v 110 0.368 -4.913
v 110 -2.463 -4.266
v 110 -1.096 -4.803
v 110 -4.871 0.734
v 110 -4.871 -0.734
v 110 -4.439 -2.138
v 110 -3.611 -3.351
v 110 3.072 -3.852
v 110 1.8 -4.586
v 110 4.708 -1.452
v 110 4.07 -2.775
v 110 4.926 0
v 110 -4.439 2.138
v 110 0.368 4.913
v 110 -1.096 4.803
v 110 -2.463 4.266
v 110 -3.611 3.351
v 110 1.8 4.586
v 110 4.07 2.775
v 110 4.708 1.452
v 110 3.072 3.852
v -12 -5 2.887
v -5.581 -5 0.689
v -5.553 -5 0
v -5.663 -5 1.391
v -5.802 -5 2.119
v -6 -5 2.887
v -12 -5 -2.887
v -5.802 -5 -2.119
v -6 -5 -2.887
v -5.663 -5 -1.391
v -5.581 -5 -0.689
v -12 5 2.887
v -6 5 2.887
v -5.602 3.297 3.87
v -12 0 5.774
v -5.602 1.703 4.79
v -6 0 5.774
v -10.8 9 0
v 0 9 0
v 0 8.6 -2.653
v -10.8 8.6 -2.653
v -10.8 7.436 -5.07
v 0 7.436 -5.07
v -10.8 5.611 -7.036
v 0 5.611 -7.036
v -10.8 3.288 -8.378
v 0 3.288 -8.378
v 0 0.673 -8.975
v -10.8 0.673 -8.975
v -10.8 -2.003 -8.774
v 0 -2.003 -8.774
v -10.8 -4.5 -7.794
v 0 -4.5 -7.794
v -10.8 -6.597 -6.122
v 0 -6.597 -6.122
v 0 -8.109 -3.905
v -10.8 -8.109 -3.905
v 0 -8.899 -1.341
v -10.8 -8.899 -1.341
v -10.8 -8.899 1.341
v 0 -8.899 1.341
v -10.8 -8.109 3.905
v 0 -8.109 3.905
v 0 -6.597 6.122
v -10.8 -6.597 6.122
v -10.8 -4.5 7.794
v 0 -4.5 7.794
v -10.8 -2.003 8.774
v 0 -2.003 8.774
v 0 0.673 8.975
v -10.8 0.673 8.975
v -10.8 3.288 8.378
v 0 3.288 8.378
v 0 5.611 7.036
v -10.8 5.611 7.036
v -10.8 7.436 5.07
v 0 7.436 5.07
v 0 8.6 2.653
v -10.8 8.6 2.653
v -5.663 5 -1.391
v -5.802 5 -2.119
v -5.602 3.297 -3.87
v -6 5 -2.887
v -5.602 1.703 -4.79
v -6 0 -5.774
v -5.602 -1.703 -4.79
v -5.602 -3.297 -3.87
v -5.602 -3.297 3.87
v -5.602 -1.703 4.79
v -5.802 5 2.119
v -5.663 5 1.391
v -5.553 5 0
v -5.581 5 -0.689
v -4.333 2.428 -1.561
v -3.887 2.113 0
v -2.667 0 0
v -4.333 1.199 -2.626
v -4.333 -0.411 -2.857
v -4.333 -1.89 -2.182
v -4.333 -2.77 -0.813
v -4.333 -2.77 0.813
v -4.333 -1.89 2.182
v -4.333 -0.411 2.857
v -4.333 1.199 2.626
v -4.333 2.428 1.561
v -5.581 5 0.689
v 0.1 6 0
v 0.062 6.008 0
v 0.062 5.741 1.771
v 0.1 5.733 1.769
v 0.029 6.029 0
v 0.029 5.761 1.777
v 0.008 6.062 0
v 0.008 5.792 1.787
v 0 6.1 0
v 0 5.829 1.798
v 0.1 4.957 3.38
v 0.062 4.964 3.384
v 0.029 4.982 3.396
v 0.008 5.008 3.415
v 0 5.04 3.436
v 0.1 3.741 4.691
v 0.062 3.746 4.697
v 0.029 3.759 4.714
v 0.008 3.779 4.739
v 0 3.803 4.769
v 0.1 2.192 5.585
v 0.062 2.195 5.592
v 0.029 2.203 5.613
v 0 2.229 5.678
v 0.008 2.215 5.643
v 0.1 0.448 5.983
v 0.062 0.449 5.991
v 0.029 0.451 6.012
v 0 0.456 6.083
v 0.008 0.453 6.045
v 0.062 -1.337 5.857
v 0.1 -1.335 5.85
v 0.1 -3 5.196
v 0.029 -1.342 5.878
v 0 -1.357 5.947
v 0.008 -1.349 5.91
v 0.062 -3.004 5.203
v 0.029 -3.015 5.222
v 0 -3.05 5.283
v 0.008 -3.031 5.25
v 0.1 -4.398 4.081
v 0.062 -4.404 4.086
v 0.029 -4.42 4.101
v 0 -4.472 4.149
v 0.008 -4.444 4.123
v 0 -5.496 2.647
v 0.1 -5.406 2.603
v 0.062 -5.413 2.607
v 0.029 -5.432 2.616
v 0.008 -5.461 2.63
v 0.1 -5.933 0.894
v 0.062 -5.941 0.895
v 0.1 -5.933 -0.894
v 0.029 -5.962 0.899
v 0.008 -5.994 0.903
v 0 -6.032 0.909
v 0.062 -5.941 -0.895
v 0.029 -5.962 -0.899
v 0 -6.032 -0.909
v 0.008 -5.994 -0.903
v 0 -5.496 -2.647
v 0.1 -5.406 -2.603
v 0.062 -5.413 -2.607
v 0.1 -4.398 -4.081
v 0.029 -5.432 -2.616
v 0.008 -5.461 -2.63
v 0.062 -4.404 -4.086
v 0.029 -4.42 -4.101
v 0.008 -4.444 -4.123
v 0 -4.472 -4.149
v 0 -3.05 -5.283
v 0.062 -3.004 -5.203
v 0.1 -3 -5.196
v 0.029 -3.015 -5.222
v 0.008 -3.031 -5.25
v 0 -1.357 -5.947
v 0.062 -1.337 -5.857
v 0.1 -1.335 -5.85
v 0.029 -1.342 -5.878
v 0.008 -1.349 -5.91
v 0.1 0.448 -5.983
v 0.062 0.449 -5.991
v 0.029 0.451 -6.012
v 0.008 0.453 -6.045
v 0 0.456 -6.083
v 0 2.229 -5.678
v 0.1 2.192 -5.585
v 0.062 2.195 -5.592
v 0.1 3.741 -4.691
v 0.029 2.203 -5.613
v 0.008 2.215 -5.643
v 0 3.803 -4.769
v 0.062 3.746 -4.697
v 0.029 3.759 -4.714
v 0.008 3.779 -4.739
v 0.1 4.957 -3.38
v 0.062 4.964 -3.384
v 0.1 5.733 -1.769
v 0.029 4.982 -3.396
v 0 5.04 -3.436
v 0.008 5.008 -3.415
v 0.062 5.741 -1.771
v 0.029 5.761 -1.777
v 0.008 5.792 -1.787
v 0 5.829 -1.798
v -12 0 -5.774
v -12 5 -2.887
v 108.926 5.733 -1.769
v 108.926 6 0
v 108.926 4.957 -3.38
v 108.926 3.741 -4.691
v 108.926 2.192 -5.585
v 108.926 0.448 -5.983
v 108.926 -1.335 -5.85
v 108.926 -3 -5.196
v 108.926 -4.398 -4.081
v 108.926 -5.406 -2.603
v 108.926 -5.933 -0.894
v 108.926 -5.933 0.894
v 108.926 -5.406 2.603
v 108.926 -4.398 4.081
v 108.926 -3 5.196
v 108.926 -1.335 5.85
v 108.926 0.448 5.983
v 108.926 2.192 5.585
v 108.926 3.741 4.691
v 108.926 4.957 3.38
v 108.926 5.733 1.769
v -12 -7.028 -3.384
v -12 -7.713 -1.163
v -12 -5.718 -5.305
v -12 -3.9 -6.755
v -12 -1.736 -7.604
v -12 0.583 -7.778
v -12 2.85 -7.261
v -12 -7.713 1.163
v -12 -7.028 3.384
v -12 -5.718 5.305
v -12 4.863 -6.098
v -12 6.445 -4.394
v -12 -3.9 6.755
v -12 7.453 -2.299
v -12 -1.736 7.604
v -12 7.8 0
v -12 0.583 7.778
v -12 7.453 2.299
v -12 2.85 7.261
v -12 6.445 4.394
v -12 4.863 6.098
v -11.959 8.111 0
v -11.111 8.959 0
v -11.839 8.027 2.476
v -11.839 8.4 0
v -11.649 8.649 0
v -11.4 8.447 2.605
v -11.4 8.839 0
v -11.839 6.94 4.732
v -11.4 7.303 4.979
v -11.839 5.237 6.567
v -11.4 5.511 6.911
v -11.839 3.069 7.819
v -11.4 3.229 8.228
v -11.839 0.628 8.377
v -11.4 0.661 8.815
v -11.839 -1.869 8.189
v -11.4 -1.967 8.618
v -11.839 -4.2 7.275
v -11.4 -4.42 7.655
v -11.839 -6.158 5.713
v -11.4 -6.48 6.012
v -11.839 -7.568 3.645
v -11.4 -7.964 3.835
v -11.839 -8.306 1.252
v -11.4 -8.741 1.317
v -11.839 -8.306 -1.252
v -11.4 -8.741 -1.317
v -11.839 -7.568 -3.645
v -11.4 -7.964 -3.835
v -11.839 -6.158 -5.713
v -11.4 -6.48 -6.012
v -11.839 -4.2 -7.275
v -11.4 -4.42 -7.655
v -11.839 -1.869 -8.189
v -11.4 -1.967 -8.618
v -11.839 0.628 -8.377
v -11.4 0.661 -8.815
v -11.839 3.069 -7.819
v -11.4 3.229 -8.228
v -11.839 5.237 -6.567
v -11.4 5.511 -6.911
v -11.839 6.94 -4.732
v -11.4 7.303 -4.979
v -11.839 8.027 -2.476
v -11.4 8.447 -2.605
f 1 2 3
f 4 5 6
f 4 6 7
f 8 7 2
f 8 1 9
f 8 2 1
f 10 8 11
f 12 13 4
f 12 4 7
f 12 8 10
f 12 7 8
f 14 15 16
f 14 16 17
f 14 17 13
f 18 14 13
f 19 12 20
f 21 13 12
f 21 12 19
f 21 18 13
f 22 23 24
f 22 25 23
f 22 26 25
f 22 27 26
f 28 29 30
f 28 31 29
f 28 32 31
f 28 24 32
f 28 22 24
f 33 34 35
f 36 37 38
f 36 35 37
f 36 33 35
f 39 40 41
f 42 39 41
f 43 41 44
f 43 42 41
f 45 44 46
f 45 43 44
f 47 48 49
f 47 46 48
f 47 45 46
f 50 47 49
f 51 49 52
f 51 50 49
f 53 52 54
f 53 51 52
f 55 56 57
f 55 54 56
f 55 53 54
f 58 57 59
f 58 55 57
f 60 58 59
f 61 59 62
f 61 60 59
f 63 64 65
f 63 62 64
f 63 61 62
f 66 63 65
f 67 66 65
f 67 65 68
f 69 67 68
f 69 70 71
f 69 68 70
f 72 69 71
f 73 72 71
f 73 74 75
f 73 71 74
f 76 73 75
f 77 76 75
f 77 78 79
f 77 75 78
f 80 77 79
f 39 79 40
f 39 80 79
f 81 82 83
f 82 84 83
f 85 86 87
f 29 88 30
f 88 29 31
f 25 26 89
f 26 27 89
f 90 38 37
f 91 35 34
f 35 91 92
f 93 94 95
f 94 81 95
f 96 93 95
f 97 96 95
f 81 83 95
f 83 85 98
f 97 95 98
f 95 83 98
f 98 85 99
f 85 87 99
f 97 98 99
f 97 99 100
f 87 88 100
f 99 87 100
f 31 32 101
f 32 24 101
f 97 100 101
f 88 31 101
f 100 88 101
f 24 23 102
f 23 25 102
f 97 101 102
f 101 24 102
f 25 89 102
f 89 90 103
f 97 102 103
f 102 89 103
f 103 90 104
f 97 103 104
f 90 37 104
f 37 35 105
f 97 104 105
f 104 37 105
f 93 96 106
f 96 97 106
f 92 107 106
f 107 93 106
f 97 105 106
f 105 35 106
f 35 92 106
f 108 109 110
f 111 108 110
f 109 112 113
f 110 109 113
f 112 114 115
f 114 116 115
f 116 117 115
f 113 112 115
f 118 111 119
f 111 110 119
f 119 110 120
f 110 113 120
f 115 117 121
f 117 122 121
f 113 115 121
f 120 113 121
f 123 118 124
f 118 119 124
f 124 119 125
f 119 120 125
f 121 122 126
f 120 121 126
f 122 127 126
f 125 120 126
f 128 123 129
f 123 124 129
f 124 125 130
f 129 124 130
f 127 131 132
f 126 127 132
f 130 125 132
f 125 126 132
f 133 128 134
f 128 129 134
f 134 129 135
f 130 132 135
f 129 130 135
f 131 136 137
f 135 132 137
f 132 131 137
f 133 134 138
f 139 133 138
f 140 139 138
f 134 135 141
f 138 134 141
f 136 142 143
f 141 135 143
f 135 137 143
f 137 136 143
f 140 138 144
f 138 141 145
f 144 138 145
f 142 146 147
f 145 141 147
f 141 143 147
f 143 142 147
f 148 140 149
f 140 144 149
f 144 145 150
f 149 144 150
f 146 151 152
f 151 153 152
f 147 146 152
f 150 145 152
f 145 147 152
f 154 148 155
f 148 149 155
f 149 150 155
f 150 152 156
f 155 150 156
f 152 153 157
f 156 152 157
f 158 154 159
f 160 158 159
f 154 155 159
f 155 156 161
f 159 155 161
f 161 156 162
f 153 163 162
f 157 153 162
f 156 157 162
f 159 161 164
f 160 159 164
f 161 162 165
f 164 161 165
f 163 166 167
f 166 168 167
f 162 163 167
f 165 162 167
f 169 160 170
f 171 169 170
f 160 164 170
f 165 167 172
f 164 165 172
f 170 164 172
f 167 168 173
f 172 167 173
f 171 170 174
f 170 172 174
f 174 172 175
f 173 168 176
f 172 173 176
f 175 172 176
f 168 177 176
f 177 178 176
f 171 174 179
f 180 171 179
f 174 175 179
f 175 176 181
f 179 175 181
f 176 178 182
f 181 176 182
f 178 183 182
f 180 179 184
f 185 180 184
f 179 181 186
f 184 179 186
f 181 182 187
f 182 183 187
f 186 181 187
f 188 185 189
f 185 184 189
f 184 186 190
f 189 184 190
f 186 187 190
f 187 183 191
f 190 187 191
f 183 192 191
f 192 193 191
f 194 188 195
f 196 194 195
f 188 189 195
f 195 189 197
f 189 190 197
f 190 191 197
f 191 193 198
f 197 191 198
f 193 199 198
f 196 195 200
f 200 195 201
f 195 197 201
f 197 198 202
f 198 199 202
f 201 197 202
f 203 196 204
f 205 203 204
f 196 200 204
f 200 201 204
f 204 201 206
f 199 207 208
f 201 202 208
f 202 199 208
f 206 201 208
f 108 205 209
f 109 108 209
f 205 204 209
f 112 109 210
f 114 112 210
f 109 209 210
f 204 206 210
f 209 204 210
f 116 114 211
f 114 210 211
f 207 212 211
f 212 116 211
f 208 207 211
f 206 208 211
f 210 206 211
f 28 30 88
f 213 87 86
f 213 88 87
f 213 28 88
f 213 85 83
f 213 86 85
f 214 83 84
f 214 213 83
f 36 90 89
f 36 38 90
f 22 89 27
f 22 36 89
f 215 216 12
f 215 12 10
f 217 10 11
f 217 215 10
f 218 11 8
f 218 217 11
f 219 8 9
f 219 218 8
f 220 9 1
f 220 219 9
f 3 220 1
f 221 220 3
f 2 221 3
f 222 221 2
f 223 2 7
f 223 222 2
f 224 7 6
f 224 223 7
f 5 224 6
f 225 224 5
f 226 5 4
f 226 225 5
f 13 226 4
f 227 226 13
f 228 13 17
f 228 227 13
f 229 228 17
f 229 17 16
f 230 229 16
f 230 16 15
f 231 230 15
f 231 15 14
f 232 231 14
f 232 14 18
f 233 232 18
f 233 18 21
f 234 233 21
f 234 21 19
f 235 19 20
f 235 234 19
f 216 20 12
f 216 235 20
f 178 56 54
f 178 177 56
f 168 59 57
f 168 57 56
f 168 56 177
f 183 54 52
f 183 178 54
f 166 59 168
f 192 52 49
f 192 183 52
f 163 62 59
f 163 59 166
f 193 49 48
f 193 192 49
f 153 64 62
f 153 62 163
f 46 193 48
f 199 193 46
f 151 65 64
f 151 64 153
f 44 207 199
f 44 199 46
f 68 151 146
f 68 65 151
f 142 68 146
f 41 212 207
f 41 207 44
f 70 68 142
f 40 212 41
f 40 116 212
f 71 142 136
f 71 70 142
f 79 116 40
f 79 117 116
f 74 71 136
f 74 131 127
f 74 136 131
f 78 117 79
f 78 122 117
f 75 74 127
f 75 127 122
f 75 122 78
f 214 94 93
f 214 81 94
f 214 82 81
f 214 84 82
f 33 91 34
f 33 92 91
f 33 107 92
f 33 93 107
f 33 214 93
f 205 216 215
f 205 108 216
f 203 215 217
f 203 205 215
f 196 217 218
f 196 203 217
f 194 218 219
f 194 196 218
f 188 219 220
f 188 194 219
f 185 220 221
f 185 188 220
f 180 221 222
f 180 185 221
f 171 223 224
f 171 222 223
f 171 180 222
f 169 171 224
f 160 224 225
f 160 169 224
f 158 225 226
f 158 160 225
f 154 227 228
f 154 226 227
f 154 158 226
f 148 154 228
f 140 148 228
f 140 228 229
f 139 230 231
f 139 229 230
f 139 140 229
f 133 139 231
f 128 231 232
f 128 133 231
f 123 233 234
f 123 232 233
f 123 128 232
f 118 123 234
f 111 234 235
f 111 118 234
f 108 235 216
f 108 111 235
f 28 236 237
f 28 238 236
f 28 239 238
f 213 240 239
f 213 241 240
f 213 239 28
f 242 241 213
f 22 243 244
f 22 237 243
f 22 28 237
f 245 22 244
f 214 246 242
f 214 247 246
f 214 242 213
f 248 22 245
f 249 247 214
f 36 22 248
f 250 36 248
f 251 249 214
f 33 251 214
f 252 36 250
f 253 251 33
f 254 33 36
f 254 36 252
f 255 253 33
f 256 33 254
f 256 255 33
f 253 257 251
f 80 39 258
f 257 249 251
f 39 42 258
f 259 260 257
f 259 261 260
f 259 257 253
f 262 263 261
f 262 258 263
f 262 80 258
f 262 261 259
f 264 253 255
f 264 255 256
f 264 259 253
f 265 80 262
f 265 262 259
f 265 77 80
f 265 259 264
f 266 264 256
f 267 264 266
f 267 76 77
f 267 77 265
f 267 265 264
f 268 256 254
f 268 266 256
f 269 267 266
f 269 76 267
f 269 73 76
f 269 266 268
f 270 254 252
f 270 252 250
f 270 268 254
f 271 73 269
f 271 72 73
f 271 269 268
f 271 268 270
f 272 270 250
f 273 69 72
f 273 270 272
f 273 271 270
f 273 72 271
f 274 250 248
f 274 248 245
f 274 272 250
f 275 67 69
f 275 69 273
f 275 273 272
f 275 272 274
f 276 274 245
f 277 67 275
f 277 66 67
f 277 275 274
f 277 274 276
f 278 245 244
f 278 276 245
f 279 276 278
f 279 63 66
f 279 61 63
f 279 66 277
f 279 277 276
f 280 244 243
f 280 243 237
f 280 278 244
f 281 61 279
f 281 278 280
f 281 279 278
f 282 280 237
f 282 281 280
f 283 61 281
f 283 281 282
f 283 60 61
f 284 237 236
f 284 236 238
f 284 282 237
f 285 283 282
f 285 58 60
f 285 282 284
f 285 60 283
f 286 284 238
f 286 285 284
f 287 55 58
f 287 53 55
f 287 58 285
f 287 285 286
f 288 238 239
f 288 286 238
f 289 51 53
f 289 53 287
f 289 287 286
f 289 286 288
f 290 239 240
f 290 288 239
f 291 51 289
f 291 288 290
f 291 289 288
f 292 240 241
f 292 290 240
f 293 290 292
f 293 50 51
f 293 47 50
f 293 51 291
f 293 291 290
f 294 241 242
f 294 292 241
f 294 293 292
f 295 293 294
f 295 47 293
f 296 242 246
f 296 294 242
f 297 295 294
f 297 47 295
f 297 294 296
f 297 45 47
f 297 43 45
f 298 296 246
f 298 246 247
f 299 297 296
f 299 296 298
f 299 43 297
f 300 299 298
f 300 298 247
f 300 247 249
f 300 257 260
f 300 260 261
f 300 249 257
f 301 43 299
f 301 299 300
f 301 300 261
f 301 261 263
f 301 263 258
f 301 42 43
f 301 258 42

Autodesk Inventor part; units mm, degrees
ref_plane "YZ Plane" through (0, 0, 0) normal (1, 0, 0) x (0, 1, 0)
ref_plane "XZ Plane" through (0, 0, 0) normal (0, 1, 0) x (-1, 0, 0)
sketch "Rascunho1" plane through (0, 0, 0) normal (0, 0, 1) x (1, 0, 0)
  line L0 (-2.6667, 0) -> (110, 0)
  line L1 (110, 0) -> (110, 6)
  line L2 (110, 6) -> (74, 6)
  line L3 (74, 6) -> (72.9264, 6)
  line L4 (72.9264, 6) -> (0, 6)
  line L5 (0, 6) -> (0, 9)
  line L6 (0, 9) -> (-12, 9)
  line L7 (-12, 9) -> (-12, 5.7735)
  line L8 (-12, 5.7735) -> (-6, 5.7735)
  line L9 (-6, 5.7735) -> (-2.6667, 0)
  line L10 (-34.4, 0) -> (122.4, 0) projected
  line L11 (0, -1.8) -> (0, 10.8) projected
  line L12 (74, 6) -> (0, 6) construction
  dimension "d1" = 36
  dimension "d2" = 1.0736
  dimension "d3" = 12
  dimension "d4" = 6
  dimension "d5" = 60
  dimension "d6" = 12
  dimension "d7" = 12
  dimension "d8" = 11.547
  dimension "d9" = 18
  dimension "d26" = 110
revolve "Corpo" add sketch "Rascunho1" angle 360 about axis through (-2.6667, 0, 0) along (1, 0, 0)
sketch "Rascunho2" plane through (-12, 0, 0) normal (-1, 0, 0) x (0, 0, 1)
  circle A0 centre (0, 0) radius 5.7735 projected
  line L0 (0, -12.6) -> (0, 12.6) projected
  line L1 (-12.6, 0) -> (12.6, 0) projected
  line L2 (5.7735, 0) -> (2.8868, -5)
  line L3 (2.8868, -5) -> (-2.8868, -5)
  line L4 (-2.8868, -5) -> (-5.7735, 0)
  line L5 (-5.7735, 0) -> (-2.8868, 5)
  line L6 (-2.8868, 5) -> (2.8868, 5)
  line L7 (2.8868, 5) -> (5.7735, 0)
extrude "Fenda" add sketch "Rascunho2" against normal up to next contours L7 A0 | A0 L2 | L6 L0 A0 | A0 L0 L3 | L0 L6 A0 | A0 L3 L0 | L4 A0 | A0 L5
fillet "Raio de arredondamento1" radius 1.2 1 edges at (-12, -9, 0)
thread "Rosca" size "M12x1.75" class "6g" standard "ANSI Metric M Profile" length 36
chamfer "Chanfrar1" distance 1.0735 distance2 1.0735 1 edges at (110, -6, 0) measured on face at (110, 1.8579, 1.646)
ref_plane "Work Plane1" through (29, 0, 0) normal (0, -1, 0) x (1, 0, 0)
fillet "Fillet2" radius 0.1 1 edges at (0, -6, 0)
equation "\"d1\" = GEL"
equation "\"d3\" = KOH"
equation "\"d4\" = INTI"
equation "\"d6\" = GD"
equation "\"d7\" = BDM"
equation "\"d8\" = 1.1547 * SW"
equation "\"d9\" = KOD"
equation "\"d26\" = NLG"
equation "\"d17\" = RR"
equation "\"d13\" = GEL"
equation "\"d15\" = -0.5 * SPD + 0.5 * GD"
equation "\"d16\" = GUL"
equation "\"d30\" = R"
equation "\"GD\" = NND"
equation "\"NLG\" = 110"
equation "\"GEL\" = 36"
equation "\"KOD\" = 18"
equation "\"KOH\" = 12"
equation "\"INTI\" = 6"
equation "\"GAL\" = 0.61345 * PTC"
equation "\"GUL\" = 0.61345 * PTC"
equation "\"BDM\" = NND"
equation "\"RR\" = 1.2"
equation "\"SPD\" = NND - 1.2269 * PTC"
equation "\"R\" = 0.1"
equation "\"TOA\" = 30deg"
equation "\"GD1\" = THREADDIA - 1.2269 * PTC"
equation "\"THREADDIA\" = 12"
equation "\"FAWI\" = 45deg"
equation "\"ANG\" = 120deg"
equation "\"PTC\" = 1.75"
equation "\"NND\" = 12"
equation "\"E0\" = 1.155 * SW"
equation "\"SW\" = 10"
properties part number "DIN 912 - M12x110" material "Aço Inox AISI 304"
